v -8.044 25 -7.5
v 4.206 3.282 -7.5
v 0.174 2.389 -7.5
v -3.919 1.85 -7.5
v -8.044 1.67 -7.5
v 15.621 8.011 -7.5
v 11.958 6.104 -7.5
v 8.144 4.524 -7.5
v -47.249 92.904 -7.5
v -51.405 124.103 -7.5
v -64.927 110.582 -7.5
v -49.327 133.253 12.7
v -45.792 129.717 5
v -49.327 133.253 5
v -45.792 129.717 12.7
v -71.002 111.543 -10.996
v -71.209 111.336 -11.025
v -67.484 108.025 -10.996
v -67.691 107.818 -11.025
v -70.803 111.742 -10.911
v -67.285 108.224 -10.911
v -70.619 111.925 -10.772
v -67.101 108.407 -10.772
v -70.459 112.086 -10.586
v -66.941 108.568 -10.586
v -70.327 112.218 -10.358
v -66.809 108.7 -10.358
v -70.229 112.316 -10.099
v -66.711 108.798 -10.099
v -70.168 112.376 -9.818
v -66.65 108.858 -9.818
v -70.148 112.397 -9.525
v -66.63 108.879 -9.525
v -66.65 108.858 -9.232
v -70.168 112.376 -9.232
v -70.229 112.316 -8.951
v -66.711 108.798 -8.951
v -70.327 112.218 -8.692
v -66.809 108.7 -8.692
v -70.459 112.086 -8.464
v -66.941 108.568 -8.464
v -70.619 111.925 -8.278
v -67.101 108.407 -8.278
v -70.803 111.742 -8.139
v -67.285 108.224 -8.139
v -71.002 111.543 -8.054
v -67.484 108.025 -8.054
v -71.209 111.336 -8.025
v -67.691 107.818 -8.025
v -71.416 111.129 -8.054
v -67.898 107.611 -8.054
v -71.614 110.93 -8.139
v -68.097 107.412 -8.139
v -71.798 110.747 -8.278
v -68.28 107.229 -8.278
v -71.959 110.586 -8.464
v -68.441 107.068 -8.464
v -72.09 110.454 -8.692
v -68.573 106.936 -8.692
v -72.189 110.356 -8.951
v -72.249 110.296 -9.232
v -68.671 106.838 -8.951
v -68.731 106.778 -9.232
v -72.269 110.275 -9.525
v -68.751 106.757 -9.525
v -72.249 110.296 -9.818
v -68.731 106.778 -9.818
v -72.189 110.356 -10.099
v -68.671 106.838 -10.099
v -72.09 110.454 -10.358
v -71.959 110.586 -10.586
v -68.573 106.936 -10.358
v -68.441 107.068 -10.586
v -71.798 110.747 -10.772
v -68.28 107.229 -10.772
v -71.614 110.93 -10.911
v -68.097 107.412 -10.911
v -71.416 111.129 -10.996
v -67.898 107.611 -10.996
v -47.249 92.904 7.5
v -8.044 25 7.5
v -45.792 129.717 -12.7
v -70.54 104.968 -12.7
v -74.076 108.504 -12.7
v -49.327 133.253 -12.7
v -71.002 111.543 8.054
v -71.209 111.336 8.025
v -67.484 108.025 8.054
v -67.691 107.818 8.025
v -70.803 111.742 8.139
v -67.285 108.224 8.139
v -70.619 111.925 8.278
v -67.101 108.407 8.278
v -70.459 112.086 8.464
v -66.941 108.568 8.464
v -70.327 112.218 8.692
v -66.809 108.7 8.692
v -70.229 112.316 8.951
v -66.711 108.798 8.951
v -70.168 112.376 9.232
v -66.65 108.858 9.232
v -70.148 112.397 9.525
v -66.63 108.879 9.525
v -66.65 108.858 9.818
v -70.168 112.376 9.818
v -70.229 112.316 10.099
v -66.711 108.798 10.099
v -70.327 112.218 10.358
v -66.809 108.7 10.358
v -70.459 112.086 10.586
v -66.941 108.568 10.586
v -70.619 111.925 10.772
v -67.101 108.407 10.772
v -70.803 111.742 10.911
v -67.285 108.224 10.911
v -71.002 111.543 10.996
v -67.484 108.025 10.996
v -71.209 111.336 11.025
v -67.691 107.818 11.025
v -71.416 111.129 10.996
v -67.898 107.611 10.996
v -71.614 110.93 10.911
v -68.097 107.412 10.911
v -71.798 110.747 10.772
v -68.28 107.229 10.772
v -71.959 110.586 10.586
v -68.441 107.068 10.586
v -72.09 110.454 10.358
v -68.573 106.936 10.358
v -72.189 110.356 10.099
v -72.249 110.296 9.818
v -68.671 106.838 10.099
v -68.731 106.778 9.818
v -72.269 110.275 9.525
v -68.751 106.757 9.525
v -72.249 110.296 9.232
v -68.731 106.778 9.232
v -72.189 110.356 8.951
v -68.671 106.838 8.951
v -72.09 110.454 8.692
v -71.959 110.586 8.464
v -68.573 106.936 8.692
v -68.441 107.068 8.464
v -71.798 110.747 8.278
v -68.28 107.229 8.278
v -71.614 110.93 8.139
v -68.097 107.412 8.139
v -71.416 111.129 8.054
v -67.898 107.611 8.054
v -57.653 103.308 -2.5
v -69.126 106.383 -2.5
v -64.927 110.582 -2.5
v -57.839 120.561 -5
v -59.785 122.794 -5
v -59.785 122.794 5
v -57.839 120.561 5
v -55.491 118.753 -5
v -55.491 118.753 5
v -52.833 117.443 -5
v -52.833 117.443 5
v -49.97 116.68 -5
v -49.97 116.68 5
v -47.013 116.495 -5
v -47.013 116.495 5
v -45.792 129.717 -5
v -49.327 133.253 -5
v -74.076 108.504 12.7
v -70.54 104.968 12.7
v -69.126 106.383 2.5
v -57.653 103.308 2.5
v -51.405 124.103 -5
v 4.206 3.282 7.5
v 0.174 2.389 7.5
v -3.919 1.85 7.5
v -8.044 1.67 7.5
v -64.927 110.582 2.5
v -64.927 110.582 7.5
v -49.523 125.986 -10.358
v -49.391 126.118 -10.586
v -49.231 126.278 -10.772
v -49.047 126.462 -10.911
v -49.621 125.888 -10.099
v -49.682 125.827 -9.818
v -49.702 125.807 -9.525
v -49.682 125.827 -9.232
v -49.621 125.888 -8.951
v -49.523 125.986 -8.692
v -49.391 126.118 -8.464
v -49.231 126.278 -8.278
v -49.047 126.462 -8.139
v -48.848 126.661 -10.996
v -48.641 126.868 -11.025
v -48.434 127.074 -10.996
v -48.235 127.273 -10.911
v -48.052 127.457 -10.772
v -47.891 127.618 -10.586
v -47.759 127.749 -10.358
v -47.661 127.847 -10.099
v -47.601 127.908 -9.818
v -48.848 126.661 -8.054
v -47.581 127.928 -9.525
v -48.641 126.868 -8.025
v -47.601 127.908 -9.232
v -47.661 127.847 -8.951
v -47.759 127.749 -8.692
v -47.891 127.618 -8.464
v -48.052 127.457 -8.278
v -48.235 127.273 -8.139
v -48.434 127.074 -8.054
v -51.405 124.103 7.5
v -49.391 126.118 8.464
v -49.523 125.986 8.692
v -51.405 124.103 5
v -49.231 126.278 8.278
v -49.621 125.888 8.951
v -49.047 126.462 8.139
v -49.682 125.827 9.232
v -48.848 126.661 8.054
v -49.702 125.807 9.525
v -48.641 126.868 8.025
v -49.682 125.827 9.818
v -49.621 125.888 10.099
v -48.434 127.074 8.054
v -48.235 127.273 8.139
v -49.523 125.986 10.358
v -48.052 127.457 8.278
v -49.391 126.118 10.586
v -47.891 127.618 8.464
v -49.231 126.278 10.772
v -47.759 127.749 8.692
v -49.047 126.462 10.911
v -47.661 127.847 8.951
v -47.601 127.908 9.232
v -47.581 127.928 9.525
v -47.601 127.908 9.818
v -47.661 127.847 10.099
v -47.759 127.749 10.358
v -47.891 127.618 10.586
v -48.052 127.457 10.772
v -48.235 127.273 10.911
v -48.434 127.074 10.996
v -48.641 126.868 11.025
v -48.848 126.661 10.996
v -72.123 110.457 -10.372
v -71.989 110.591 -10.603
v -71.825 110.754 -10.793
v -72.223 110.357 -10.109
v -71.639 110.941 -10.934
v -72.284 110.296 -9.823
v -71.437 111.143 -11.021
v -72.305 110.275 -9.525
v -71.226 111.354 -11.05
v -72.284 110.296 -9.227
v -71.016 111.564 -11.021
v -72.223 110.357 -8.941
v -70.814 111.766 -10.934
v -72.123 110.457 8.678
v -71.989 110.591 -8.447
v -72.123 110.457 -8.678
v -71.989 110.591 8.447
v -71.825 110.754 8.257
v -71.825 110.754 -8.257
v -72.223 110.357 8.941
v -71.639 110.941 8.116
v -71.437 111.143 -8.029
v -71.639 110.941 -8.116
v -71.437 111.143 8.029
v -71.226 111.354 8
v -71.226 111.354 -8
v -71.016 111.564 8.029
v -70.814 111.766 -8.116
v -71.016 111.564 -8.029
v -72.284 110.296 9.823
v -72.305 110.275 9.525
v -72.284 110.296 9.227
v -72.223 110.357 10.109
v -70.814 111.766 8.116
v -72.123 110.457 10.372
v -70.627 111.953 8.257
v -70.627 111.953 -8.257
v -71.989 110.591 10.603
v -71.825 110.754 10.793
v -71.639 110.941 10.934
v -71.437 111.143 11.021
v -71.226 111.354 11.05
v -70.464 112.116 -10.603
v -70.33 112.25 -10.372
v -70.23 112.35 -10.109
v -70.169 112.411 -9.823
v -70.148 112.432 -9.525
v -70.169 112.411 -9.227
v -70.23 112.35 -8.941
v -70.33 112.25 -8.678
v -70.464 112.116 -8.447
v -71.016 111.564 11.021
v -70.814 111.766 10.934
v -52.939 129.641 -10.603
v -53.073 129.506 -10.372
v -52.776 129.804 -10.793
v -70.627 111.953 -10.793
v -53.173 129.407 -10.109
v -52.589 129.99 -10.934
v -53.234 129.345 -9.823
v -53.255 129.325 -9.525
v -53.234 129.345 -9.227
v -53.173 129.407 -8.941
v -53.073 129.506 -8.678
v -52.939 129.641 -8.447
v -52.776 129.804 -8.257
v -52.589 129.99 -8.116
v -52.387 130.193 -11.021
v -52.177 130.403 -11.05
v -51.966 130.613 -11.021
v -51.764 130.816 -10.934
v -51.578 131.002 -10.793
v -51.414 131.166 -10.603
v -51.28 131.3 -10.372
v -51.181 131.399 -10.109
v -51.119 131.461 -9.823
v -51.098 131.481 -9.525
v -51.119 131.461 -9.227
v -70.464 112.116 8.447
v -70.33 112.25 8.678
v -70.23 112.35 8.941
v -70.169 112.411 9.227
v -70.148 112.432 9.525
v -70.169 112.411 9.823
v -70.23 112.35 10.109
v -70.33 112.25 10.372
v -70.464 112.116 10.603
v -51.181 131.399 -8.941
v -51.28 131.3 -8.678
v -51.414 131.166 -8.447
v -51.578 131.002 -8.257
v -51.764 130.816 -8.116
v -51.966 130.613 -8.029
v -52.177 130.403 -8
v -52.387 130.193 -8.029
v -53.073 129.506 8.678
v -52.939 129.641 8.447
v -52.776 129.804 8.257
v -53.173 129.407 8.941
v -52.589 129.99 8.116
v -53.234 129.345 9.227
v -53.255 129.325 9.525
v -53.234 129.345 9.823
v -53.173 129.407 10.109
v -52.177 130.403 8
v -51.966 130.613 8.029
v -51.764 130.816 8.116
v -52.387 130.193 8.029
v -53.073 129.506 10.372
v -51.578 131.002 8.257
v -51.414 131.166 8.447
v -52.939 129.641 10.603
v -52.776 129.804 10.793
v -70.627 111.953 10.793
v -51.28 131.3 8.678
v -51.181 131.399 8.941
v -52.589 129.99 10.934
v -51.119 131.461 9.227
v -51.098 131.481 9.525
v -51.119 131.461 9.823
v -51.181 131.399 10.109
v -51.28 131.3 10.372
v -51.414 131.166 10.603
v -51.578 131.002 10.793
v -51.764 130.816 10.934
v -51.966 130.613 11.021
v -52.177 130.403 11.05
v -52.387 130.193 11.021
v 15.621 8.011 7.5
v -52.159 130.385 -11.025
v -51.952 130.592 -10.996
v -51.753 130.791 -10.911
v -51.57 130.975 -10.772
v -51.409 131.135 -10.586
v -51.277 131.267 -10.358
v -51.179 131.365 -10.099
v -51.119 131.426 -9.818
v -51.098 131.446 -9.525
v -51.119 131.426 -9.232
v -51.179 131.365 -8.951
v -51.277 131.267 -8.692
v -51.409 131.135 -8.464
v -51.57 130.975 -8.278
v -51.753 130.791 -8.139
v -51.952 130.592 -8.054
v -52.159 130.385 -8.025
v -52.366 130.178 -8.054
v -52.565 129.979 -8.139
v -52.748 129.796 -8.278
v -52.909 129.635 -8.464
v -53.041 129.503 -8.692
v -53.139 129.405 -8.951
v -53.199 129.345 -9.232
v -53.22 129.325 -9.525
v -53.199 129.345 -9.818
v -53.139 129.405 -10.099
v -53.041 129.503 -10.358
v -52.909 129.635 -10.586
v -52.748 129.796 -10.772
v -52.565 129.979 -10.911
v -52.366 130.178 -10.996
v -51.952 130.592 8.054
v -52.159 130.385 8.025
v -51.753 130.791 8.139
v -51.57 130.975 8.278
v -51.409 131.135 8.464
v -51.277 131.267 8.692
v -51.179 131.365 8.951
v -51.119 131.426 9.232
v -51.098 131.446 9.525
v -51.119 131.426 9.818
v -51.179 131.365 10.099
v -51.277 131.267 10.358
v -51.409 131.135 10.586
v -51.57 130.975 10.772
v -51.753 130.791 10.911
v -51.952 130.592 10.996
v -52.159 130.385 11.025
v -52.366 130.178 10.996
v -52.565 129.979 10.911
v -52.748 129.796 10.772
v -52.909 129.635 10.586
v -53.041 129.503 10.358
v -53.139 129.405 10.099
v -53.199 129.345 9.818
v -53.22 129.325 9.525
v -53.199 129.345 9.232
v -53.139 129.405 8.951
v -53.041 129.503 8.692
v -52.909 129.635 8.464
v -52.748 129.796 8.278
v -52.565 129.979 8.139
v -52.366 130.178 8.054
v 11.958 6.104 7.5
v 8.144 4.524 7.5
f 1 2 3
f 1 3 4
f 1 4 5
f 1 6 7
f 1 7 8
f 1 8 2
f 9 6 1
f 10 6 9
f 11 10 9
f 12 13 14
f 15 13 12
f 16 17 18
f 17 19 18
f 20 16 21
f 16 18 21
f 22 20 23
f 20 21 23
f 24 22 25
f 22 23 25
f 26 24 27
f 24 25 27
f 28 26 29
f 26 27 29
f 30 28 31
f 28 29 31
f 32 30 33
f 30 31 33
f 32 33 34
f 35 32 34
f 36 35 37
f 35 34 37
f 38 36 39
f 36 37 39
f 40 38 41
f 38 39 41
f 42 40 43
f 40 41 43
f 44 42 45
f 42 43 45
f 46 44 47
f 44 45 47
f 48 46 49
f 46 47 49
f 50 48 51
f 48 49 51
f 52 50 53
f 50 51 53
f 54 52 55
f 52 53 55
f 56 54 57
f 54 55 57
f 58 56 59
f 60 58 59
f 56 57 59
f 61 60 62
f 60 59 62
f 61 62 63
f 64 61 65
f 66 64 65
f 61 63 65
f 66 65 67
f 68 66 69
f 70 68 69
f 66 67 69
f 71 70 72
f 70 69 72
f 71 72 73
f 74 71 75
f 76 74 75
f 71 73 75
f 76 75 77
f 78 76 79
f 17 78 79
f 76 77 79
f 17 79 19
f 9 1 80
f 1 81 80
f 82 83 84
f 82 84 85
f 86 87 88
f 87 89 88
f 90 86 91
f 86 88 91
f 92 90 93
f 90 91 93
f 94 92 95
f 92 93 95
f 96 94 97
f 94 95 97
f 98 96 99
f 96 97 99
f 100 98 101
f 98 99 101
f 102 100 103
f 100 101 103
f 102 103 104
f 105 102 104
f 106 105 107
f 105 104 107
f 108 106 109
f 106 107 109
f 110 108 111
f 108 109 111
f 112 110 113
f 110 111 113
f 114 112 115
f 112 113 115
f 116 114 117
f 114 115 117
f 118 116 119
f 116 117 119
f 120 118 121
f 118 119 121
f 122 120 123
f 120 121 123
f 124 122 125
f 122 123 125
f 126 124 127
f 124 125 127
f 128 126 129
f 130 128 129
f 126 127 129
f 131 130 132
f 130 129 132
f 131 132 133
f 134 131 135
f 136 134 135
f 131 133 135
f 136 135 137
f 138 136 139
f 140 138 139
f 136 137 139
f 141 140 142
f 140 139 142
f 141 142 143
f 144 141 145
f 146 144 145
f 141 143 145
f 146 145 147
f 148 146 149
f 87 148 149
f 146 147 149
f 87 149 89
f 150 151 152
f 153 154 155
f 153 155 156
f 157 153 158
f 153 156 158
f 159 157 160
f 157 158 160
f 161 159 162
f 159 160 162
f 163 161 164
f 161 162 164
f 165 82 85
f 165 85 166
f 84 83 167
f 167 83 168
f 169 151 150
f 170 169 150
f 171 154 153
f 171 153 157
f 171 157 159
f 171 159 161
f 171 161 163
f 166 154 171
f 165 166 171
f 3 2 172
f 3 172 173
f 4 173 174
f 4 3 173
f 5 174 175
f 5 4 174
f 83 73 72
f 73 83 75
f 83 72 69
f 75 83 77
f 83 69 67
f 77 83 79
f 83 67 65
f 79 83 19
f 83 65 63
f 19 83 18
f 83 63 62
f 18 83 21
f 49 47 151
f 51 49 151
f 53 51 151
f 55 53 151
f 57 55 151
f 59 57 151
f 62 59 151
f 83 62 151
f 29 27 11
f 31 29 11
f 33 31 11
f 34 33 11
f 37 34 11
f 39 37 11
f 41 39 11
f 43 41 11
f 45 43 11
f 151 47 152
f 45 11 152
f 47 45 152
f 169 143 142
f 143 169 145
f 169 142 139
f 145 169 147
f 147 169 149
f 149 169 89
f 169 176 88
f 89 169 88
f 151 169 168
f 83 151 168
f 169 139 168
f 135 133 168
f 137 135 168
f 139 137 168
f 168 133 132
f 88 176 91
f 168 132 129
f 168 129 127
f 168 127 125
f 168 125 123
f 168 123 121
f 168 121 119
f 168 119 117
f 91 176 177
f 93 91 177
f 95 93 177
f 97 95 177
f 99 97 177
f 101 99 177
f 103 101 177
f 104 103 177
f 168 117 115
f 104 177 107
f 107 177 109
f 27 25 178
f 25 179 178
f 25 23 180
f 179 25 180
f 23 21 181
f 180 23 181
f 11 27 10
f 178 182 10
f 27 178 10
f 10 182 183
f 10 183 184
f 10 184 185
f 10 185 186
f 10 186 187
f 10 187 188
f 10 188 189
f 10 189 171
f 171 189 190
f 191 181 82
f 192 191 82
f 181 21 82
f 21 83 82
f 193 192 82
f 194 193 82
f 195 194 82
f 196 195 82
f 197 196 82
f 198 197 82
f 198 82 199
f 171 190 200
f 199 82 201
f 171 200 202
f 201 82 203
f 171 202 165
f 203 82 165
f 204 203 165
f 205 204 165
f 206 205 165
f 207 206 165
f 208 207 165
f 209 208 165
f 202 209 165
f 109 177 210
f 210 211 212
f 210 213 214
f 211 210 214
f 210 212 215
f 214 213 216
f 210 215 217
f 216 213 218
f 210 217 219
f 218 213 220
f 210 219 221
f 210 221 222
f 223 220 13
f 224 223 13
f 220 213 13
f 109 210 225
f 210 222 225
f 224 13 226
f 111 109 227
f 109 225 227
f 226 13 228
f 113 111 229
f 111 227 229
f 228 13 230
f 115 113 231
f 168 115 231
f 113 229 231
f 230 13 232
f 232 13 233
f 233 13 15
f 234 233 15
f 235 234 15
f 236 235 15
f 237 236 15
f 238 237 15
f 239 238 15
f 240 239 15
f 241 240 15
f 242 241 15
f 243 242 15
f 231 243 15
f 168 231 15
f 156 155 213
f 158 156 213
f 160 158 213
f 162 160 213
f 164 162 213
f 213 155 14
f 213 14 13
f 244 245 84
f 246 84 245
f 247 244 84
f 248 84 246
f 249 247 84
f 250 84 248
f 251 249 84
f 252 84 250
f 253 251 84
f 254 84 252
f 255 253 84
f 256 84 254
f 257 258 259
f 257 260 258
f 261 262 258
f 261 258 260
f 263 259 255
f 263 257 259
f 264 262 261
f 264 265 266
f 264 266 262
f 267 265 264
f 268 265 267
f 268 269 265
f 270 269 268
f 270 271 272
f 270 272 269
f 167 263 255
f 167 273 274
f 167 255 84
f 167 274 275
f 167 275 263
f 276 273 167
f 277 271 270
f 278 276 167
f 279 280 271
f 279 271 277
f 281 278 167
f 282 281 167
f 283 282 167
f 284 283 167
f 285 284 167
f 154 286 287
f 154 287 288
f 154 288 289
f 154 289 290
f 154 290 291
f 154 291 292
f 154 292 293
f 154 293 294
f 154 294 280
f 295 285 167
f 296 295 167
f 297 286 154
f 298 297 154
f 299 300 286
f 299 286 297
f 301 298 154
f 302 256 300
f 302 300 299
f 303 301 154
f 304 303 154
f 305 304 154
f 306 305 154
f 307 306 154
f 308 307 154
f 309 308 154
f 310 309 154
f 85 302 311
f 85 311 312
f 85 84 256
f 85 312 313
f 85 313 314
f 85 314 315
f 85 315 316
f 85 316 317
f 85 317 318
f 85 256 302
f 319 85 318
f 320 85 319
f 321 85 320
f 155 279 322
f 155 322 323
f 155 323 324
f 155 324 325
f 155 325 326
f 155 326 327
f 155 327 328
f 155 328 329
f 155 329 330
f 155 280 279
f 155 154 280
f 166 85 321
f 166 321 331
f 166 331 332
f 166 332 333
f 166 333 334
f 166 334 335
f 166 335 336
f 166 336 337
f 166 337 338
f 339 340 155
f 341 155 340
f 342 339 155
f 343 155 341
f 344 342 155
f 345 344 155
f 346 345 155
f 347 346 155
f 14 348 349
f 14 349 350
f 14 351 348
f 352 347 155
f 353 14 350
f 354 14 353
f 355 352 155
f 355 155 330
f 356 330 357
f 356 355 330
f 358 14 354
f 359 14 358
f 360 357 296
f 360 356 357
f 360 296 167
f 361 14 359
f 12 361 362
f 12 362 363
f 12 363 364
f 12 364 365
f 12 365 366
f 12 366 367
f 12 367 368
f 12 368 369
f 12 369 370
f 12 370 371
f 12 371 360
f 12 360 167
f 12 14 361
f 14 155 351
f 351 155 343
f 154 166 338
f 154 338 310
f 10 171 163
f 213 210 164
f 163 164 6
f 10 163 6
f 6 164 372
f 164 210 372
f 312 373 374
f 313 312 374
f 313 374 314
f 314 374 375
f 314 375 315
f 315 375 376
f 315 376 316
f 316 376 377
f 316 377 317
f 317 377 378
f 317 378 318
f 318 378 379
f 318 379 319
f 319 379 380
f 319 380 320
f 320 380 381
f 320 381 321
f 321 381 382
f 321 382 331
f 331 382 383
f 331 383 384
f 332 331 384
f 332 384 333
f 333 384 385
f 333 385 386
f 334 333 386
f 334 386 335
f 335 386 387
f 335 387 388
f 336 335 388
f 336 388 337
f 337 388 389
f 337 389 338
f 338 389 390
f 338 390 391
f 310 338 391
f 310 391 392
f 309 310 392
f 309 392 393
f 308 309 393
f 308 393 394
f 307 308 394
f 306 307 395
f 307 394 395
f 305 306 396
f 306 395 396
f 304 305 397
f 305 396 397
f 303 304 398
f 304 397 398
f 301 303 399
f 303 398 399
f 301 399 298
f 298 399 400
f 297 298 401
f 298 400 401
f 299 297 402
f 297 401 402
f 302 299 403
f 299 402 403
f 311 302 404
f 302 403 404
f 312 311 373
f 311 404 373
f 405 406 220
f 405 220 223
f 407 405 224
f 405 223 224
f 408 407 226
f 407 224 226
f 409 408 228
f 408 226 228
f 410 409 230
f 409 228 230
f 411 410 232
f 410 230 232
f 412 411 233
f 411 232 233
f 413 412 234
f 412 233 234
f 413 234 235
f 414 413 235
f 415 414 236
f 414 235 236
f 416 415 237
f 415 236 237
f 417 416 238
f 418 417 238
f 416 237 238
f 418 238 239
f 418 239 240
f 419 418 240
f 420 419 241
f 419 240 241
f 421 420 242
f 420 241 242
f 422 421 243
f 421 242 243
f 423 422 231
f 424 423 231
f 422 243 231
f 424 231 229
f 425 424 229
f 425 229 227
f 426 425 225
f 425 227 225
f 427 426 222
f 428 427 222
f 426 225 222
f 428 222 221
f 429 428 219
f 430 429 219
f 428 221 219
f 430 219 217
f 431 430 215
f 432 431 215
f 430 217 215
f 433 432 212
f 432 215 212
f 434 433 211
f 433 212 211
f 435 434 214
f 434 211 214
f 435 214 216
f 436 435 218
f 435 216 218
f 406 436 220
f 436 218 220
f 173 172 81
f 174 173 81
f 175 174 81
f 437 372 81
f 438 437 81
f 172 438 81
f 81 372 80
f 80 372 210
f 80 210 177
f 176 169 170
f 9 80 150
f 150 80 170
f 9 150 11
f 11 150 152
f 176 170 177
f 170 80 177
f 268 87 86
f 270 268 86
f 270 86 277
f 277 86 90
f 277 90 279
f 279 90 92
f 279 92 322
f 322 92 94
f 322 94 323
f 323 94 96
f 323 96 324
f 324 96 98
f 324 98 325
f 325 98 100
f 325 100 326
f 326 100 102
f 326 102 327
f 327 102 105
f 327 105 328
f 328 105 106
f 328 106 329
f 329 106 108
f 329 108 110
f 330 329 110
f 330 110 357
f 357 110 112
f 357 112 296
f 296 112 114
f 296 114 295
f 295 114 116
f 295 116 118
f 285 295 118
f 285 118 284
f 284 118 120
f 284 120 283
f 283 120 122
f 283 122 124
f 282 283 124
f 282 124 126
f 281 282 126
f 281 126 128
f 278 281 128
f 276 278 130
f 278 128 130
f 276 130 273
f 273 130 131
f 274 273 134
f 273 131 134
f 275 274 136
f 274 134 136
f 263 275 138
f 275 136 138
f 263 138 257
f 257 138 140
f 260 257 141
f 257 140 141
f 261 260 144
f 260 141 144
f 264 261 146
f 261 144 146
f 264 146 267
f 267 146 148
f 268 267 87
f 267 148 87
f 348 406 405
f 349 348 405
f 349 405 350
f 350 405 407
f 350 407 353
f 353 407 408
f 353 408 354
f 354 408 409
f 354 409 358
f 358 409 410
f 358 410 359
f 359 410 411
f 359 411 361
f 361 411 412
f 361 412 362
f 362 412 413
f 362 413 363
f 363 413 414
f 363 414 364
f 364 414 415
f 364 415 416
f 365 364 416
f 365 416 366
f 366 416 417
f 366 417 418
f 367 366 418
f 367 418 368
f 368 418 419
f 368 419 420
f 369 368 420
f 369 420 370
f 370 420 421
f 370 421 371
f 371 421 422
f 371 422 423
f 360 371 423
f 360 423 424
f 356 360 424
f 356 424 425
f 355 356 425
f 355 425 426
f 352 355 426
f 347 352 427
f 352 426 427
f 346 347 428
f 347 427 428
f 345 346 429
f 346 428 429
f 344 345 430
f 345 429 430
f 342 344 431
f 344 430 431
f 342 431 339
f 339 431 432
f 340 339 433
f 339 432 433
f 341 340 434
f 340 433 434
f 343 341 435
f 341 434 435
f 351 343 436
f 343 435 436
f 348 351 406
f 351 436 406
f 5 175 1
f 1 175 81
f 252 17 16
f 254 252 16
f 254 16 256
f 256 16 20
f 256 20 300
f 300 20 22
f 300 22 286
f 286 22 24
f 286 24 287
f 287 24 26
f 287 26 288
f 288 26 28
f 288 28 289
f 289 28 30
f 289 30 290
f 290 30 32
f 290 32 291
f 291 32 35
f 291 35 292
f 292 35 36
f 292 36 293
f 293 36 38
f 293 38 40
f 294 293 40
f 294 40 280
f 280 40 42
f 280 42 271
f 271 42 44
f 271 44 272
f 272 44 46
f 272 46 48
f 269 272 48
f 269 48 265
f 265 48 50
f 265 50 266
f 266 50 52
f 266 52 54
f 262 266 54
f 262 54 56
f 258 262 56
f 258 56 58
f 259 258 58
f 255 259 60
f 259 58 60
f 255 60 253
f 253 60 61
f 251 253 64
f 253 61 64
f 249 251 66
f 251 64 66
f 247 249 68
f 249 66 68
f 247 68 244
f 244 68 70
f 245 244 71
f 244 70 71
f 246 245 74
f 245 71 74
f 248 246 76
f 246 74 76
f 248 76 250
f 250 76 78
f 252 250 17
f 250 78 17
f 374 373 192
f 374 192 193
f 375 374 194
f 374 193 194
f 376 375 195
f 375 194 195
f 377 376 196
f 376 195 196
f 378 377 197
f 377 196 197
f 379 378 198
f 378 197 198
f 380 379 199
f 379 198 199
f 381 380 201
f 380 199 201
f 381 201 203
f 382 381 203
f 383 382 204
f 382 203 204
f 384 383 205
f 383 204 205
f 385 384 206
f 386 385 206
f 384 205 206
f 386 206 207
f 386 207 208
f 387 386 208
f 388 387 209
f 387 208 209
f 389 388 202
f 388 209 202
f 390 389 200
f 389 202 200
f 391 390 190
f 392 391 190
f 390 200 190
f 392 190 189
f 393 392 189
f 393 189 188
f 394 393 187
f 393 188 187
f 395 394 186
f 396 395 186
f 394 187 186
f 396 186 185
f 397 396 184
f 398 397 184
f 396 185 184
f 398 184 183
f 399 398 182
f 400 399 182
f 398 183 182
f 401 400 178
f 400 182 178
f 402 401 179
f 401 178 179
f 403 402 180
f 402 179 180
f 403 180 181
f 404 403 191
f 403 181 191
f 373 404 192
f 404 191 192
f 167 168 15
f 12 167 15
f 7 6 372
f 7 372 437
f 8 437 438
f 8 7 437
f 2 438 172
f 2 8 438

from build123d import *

# Parameters (mm, degrees)
TIBIA_RAW_DEPTH                 = 7.5
ARRONDISSEMENT_PATTE_DEPTH      = 141.261849538
ARRONDISSEMENT_PATTE_DEPTH_BACK = 141.261849538
SKETCH10_W                      = 25.4
SKETCH10_H                      = 35
BOSS_EXTRUDE3_DEPTH             = 5
SKETCH11_R                      = 15
CUT_EXTRUDE3_DEPTH              = 5
F_3_0MM_DOWEL_HOLE2_D           = 3
F_3_0MM_DOWEL_HOLE2_CSINK_D     = 3.05
F_3_0MM_DOWEL_HOLE2_CSINK_ANGLE = 90
RIB2_REACH                      = 154.986
SKETCH14_WALL_W                 = 319.8505485
SKETCH14_WALL_H                 = 5


with BuildPart() as part:
    # Sketch1 → tibia_raw (new, symmetric)
    with BuildSketch(Plane.XY):
        Polygon((-8.044335554, 0), (-8.044335554, 25), (-47.248988291, 92.904450435), (-64.926657821, 110.582119965), (-51.405330856, 124.10344693), (16.455664446, 6.564755215), align=None)
    extrude(amount=TIBIA_RAW_DEPTH, both=True)

    # Sketch4 → arrondissement_patte (cut, two sides: drawn at the far end of the back side and taken through both)
    with BuildSketch(Plane.XY.offset(-ARRONDISSEMENT_PATTE_DEPTH_BACK)):
        with BuildLine():
            ThreePointArc((4.205663462, 3.282377343), (-1.866483675, 2.074552283), (-8.044335554, 1.669634512))
            Line((-8.044335554, 1.669634512), (-8.044335554, 0))
            Line((-8.044335554, 0), (4.205663462, 3.282377343))
        make_face()
        with BuildLine():
            ThreePointArc((15.620847191, 8.010701117), (10.068210696, 5.272443864), (4.205663462, 3.282377343))
            Line((4.205663462, 3.282377343), (16.455664446, 6.564755215))
            Line((16.455664446, 6.564755215), (15.620847191, 8.010701117))
        make_face()
    extrude(amount=ARRONDISSEMENT_PATTE_DEPTH + ARRONDISSEMENT_PATTE_DEPTH_BACK, mode=Mode.SUBTRACT)

    # Sketch10 → Boss-Extrude3 (add)
    with BuildSketch(Plane(origin=(-87.754388893, 87.754388893, 0), x_dir=(0, 0, 1), z_dir=(-0.7071067811865487, 0.7071067811865465, 0))):
        with Locations((0, 41.844308868)):
            Rectangle(SKETCH10_W, SKETCH10_H)
    extrude(amount=BOSS_EXTRUDE3_DEPTH)

    # Sketch11 → Cut-Extrude3 (cut, symmetric)
    with BuildSketch(Plane.XY):
        with Locations((-47.559392621, 131.484919071)):
            Circle(SKETCH11_R)
    extrude(amount=CUT_EXTRUDE3_DEPTH, both=True, mode=Mode.SUBTRACT)

    # Ø3.0mm Dowel Hole2 (through all)
    with Locations(Plane(origin=(-91.289922799, 91.289922799, 0), x_dir=(0, 0, 1), z_dir=(-0.7071067811865488, 0.7071067811865464, 0))):
        with Locations((-9.525, 55.314308868), (9.525, 55.314308868), (9.525, 28.374308868), (-9.525, 28.374308868)):
            CounterSinkHole(F_3_0MM_DOWEL_HOLE2_D / 2, F_3_0MM_DOWEL_HOLE2_CSINK_D / 2, counter_sink_angle=F_3_0MM_DOWEL_HOLE2_CSINK_ANGLE)

    # Sketch14 wall → Rib2 (add, up to next)
    with BuildSketch(Plane(origin=(-63.389537203, 104.845507721, 0), x_dir=(0.965925826292, -0.258819045091, 0), z_dir=(0.258819045091, 0.965925826292, 0)), mode=Mode.PRIVATE) as rib2_sk1:
        Rectangle(SKETCH14_WALL_W, SKETCH14_WALL_H)
    rib2_tool1 = extrude(rib2_sk1.sketch, amount=RIB2_REACH, mode=Mode.PRIVATE) - part.part
    add(rib2_tool1.solids().sort_by_distance((-63.389537203, 104.845507721, 0))[0])


solid = part.part
